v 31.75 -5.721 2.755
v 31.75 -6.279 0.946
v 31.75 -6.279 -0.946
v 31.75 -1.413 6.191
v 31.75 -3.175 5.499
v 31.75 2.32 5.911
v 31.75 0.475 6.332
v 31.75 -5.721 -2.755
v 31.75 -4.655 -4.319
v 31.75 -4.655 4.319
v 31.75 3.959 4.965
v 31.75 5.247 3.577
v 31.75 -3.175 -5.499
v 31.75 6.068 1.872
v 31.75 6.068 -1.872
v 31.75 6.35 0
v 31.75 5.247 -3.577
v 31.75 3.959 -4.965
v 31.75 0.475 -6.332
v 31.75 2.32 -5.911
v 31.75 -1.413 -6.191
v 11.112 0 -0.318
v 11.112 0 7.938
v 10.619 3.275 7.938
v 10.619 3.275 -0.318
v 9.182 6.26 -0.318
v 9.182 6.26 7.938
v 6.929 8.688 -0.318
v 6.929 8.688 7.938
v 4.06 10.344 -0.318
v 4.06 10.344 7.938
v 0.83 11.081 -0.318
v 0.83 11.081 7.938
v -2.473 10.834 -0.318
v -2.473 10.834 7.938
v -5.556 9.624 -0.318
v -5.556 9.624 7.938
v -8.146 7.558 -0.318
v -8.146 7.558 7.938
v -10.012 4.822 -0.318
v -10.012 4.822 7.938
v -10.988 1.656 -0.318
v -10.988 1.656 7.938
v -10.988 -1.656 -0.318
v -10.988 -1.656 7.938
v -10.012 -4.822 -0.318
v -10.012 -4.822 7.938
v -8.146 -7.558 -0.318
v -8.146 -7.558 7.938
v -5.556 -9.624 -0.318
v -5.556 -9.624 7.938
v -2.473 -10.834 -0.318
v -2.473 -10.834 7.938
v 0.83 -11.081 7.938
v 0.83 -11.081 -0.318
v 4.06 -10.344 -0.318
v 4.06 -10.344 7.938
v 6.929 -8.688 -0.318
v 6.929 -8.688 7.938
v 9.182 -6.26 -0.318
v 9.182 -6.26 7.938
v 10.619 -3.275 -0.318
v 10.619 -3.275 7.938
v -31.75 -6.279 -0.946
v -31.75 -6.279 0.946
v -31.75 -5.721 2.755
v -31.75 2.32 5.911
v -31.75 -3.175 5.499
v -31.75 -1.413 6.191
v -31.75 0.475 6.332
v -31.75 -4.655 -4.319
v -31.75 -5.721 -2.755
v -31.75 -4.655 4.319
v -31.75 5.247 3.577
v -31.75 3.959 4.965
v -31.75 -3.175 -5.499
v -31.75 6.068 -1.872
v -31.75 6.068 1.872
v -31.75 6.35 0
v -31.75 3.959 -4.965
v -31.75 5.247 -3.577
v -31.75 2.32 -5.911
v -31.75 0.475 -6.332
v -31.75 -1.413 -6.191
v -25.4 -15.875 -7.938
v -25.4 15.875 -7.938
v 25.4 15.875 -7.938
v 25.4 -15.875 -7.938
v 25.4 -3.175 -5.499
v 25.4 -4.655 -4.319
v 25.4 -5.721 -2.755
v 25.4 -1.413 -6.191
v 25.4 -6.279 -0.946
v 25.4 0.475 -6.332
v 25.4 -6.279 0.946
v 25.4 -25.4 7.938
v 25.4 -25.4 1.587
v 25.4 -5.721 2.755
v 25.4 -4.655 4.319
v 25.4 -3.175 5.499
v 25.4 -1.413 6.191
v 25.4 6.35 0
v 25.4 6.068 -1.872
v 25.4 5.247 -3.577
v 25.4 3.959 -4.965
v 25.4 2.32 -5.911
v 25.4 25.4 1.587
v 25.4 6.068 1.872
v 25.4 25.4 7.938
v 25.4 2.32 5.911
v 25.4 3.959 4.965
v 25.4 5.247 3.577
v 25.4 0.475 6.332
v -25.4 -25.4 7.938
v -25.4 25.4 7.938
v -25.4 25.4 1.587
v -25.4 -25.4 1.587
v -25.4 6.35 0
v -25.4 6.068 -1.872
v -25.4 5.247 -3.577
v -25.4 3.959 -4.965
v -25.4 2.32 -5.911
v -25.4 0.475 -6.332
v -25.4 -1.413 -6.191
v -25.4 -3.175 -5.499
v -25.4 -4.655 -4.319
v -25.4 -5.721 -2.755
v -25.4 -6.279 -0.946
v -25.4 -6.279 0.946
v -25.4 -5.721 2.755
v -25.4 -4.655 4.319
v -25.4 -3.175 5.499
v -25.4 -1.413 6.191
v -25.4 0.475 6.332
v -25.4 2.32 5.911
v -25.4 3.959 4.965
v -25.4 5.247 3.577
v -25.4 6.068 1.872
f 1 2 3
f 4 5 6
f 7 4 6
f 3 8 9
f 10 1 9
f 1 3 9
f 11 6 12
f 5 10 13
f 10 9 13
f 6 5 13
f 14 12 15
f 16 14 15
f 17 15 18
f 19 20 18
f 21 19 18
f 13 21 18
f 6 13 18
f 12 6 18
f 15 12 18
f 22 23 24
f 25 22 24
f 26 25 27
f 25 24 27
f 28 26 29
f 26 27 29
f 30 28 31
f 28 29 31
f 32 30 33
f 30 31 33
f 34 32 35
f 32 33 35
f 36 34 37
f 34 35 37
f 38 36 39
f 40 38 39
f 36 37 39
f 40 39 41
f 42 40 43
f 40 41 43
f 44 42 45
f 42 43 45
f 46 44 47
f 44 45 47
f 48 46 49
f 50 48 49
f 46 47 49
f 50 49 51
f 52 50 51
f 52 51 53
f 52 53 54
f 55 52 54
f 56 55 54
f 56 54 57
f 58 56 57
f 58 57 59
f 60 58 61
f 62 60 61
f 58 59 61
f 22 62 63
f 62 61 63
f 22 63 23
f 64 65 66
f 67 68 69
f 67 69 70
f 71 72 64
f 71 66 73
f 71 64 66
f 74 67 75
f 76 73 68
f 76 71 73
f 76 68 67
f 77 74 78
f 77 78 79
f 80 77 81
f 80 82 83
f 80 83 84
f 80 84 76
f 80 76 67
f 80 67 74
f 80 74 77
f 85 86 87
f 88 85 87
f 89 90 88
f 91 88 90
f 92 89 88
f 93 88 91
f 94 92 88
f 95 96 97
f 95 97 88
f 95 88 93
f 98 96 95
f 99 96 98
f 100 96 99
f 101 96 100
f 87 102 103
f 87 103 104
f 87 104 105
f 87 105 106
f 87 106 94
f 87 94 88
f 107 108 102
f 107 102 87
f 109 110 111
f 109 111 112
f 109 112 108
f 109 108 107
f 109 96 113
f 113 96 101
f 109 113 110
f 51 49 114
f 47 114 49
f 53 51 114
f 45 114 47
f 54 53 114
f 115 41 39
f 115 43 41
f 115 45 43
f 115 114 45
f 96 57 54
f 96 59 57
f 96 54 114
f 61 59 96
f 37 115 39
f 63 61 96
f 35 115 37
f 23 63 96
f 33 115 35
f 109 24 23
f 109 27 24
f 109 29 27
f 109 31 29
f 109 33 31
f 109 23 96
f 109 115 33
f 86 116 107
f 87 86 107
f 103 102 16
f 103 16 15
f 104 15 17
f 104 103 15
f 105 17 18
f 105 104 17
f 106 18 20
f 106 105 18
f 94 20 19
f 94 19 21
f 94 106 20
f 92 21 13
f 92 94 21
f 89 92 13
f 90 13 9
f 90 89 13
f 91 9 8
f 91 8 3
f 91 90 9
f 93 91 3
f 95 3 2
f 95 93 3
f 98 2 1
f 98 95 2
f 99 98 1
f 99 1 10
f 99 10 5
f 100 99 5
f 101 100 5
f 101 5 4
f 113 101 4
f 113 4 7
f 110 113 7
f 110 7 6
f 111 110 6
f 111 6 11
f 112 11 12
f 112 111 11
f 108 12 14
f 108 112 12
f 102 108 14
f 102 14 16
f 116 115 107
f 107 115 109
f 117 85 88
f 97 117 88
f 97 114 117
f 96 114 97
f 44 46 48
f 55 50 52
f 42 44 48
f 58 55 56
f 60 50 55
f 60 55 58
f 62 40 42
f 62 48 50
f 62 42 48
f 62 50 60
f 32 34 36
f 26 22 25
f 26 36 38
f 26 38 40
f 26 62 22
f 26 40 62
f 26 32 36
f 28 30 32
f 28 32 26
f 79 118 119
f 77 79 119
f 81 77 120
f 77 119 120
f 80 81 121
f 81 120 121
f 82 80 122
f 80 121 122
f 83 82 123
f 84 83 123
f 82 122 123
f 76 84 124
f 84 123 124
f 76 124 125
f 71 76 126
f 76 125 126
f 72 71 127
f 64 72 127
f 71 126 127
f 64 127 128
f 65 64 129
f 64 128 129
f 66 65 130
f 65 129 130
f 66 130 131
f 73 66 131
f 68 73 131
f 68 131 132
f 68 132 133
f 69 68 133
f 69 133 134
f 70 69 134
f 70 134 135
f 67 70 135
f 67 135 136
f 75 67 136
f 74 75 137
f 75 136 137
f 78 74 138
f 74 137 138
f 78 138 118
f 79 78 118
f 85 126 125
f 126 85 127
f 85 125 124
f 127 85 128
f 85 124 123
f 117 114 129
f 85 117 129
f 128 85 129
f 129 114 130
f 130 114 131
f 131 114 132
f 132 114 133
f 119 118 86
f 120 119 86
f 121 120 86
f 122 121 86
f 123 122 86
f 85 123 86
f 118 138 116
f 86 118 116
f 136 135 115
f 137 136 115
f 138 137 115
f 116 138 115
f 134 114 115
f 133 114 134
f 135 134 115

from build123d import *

# Parameters (mm, degrees)
SKETCH1_W          = 50.8
SKETCH1_H          = 50.8
EXTRUDE1_DEPTH     = 7.9375
SKETCH6_R          = 11.1125
CUT_EXTRUDE2_DEPTH = 8.255
SKETCH3_R          = 6.35
EXTRUDE3_DEPTH     = 6.35
CHAMFER1_SIZE      = 9.525


with BuildPart() as part:
    # Sketch1 → Extrude1 (new body, symmetric)
    with BuildSketch(Plane.XY):
        Rectangle(SKETCH1_W, SKETCH1_H)
    extrude(amount=EXTRUDE1_DEPTH, both=True)

    # Sketch6 → Cut-Extrude2 (cut)
    with BuildSketch(Plane.XY.offset(7.9375)):
        Circle(SKETCH6_R)
    extrude(amount=-CUT_EXTRUDE2_DEPTH, mode=Mode.SUBTRACT)

    # Sketch3 → Extrude3 (add)
    with BuildSketch(Plane.ZY.offset(25.4)):
        with Locations(Location((0, 0, 0), (0, 0, 90))):  # turned: the seam where the file's is
            Circle(SKETCH3_R)
    extrude3 = extrude(amount=EXTRUDE3_DEPTH)

    # Mirror2: Extrude3 across plane
    add(extrude3.mirror(Plane(origin=(0, 0, 0), x_dir=(0, 0, 1), z_dir=(1, 0, 0))))

    # Chamfer1
    chamfer1_edges = [part.edges().sort_by_distance(p)[0] for p in [
        (0, 25.4, -7.9375),
        (0, -25.4, -7.9375),
    ]]
    chamfer(chamfer1_edges, length=CHAMFER1_SIZE)


solid = part.part
